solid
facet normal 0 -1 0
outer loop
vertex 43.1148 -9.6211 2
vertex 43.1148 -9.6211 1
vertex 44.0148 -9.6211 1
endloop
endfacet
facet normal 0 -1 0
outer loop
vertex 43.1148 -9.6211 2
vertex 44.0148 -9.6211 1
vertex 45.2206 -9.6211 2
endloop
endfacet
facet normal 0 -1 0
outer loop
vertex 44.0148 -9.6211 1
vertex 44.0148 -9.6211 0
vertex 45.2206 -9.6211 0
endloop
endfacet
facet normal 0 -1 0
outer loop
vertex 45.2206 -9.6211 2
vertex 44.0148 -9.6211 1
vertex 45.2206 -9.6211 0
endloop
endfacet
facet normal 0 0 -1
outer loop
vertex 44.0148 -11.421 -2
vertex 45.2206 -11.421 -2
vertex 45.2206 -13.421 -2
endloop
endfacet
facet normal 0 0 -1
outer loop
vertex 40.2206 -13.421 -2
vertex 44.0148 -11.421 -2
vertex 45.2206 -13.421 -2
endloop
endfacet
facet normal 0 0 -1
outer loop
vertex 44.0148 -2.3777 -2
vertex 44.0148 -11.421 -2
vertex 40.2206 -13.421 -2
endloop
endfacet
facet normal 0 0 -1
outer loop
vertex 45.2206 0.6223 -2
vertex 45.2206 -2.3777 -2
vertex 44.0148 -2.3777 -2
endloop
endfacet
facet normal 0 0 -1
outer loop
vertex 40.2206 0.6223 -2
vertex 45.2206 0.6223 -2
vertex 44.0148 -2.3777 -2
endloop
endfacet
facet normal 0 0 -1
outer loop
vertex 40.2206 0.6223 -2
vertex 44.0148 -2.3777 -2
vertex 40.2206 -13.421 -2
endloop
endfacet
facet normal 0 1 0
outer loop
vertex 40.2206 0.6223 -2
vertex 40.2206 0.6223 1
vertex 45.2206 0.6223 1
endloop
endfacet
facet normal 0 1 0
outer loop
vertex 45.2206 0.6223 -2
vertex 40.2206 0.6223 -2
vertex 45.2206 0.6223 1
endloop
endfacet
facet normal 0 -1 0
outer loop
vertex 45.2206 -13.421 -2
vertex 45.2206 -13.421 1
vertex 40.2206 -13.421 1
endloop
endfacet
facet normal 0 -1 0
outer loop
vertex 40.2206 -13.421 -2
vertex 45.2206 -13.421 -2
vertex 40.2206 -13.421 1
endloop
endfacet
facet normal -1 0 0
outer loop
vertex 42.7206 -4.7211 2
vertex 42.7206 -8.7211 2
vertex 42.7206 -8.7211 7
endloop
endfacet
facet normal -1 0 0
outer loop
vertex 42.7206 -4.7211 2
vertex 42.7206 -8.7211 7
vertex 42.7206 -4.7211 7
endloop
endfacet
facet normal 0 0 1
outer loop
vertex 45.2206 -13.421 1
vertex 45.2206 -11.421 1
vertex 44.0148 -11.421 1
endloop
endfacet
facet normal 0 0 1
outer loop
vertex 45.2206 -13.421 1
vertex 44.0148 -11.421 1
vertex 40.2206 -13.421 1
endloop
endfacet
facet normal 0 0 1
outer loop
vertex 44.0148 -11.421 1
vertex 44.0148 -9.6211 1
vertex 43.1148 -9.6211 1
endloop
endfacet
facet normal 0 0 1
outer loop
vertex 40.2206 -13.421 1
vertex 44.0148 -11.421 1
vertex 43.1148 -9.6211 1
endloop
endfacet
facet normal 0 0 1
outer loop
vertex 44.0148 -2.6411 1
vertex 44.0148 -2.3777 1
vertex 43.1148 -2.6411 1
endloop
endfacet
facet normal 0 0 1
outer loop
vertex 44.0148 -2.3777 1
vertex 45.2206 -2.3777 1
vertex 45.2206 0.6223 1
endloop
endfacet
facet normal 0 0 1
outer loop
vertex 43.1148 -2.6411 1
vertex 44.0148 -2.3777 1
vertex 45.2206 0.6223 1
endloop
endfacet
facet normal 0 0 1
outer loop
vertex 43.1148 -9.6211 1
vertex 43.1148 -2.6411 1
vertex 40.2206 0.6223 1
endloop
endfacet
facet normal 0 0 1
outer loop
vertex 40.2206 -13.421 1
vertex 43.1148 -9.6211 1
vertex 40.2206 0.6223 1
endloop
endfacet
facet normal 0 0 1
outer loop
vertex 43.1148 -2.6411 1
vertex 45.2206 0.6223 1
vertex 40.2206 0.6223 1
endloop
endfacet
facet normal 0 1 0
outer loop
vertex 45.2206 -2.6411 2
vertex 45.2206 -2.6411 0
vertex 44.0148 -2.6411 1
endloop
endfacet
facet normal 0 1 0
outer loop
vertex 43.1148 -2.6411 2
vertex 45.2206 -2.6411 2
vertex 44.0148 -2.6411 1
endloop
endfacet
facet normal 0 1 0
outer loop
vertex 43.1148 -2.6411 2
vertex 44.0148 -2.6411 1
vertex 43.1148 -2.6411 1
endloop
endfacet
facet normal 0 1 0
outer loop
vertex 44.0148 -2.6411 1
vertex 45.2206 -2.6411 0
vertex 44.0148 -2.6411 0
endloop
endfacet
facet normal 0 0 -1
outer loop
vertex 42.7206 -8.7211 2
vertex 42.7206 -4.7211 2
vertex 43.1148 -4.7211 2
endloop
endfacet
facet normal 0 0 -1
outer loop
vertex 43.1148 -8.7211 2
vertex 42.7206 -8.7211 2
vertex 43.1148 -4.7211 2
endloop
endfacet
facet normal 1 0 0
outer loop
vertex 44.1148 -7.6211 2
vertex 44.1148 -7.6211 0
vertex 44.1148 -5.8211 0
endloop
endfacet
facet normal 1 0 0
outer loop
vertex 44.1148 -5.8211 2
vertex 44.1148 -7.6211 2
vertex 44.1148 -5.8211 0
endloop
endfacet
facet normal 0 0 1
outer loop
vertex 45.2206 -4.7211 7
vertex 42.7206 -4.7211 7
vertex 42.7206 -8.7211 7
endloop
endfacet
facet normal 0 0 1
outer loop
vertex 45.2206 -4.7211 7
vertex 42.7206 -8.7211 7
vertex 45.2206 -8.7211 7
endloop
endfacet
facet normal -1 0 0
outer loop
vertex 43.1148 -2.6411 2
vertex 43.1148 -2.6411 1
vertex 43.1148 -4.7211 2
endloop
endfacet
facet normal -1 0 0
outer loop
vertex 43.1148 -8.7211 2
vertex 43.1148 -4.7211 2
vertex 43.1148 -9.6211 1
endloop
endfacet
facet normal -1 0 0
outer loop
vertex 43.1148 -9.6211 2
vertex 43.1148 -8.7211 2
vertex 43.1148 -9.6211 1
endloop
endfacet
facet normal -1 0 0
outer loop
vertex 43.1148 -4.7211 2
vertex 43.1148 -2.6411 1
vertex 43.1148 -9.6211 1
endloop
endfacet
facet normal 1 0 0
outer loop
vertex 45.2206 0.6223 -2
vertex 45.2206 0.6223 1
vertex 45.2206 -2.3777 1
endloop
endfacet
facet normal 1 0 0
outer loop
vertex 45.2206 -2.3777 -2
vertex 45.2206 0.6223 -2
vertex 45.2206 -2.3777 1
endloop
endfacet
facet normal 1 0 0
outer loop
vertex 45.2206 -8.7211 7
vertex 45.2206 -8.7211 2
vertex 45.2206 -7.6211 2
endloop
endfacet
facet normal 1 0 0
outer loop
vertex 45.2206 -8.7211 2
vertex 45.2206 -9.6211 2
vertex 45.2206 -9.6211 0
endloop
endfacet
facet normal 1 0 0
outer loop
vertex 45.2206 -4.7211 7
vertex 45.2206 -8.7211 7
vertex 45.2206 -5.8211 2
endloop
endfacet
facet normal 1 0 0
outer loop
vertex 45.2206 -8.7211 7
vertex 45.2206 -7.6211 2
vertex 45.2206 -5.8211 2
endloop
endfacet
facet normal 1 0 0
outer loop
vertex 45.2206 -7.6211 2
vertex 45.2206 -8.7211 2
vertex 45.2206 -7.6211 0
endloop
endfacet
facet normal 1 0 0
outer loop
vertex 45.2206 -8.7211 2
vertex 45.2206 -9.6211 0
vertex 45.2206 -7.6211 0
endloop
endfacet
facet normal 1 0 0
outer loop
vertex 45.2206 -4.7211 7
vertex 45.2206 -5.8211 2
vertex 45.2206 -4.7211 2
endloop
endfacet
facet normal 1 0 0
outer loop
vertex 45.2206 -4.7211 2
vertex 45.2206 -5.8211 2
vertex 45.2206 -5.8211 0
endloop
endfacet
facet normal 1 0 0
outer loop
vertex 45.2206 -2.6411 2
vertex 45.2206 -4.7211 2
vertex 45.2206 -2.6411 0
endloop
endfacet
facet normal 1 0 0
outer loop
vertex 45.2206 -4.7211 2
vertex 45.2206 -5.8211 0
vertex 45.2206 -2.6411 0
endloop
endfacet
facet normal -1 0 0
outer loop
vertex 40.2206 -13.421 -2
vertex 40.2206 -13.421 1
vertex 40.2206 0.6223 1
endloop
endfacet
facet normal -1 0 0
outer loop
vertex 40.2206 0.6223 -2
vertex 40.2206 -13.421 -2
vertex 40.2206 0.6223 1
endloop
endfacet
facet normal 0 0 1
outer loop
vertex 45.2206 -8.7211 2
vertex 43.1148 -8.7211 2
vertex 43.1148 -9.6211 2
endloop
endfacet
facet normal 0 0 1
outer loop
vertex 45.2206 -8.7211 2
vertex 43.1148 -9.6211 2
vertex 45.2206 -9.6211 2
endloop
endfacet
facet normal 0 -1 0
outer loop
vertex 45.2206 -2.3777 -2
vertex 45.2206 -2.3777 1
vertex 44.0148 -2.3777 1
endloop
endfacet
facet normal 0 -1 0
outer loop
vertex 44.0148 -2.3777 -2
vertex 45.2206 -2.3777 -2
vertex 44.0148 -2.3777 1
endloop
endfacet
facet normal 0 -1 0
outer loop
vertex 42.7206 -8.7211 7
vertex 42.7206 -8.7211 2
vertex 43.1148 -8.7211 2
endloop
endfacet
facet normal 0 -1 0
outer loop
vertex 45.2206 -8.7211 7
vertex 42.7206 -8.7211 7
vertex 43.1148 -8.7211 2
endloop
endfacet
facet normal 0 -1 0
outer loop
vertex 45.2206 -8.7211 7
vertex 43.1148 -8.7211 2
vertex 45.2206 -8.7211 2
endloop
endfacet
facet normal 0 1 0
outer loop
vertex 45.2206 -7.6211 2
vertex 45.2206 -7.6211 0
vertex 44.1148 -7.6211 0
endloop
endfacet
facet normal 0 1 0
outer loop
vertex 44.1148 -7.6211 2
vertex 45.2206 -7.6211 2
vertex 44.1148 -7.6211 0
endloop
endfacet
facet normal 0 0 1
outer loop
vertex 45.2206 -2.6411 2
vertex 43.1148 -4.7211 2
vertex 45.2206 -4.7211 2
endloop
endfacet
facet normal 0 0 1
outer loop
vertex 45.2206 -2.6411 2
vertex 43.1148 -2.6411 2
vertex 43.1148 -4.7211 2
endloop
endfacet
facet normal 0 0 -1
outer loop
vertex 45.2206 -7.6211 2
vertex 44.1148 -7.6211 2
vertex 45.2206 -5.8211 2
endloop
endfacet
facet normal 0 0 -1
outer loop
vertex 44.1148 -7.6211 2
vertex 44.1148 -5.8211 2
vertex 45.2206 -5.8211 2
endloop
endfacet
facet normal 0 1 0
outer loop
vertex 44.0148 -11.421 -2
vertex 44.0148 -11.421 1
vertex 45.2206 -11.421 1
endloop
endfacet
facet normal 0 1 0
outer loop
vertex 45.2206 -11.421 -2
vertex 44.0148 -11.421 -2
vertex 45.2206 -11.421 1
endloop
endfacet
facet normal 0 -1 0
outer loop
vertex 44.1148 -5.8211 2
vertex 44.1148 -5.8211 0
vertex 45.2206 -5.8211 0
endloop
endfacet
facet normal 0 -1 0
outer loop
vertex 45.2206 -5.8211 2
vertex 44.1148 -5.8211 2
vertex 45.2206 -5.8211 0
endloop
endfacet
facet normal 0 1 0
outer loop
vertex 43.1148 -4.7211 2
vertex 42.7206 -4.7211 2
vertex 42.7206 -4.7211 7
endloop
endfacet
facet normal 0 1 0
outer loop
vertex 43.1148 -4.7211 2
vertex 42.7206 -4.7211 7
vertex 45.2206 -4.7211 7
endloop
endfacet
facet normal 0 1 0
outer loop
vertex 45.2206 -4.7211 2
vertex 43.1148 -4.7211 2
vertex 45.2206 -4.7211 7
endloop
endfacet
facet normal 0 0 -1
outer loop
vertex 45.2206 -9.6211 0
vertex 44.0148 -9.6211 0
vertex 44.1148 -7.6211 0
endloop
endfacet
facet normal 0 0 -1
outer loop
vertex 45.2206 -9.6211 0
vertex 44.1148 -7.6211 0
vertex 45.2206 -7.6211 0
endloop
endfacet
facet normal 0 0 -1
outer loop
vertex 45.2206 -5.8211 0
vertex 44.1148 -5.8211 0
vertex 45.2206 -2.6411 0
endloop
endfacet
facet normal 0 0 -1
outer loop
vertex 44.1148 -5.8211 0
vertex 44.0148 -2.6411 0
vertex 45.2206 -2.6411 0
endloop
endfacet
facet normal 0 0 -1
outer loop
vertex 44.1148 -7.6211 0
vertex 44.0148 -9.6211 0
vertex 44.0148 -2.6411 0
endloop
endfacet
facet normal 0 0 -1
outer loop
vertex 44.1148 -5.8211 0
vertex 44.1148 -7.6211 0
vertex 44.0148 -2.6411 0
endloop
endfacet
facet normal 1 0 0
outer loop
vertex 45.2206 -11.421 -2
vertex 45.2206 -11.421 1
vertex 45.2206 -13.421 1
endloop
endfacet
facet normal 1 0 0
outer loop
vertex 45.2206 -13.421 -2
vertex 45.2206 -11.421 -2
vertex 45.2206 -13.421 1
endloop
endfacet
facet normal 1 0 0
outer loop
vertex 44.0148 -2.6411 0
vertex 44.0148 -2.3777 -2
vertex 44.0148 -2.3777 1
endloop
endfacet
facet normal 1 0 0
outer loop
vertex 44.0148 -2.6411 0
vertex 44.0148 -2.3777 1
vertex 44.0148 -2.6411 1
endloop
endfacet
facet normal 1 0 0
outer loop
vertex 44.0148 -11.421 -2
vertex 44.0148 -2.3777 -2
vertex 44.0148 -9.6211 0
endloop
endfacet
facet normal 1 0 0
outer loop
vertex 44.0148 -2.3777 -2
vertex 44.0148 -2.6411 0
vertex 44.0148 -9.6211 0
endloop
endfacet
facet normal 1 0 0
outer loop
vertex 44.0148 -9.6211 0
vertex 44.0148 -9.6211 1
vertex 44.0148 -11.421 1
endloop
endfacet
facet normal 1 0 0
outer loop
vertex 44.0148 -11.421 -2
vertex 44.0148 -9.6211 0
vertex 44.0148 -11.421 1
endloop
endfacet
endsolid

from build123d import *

# Parameters (mm, degrees)
SALIENTE_EXTRUIR1_DEPTH      = 2
CROQUIS2_W                   = 2.5
CROQUIS2_H                   = 4
SALIENTE_EXTRUIR2_DEPTH      = 5
SALIENTE_EXTRUIR3_DEPTH      = 2
SALIENTE_EXTRUIR3_DEPTH_BACK = 1


with BuildPart() as part:
    # Croquis1 → Saliente-Extruir1 (new body)
    with BuildSketch(Plane.XY):
        Polygon((44.714751496, -7.621064437), (44.114751496, -7.621064437), (44.114751496, -5.821064437), (45.220609876, -5.821064437), (45.220609876, -4.641064437), (45.220609876, -2.641064437), (43.114751496, -2.641064437), (43.114751496, -9.621064437), (44.114751496, -9.621064437), (45.220609876, -9.621064437), (45.220609876, -7.621064437), align=None)
    extrude(amount=SALIENTE_EXTRUIR1_DEPTH)

    # Croquis2 → Saliente-Extruir2 (add)
    with BuildSketch(Plane.XY.offset(2)):
        with Locations((43.970609876, -6.721064437)):
            Rectangle(CROQUIS2_W, CROQUIS2_H)
    extrude(amount=SALIENTE_EXTRUIR2_DEPTH)

    # Croquis3 → Saliente-Extruir3 (add, two sides: drawn at the far end of the back side and taken through both)
    with BuildSketch(Plane(origin=(0, 0, 0), x_dir=(-1, 0, 0), z_dir=(0, 0, -1)).offset(-SALIENTE_EXTRUIR3_DEPTH_BACK)):
        Polygon((-44.014751496, -2.37771269), (-44.014751496, -9.420966811), (-44.014751496, -11.420966811), (-45.220609876, -11.420966811), (-45.220609876, -13.420966811), (-40.220609876, -13.420966811), (-40.220609876, -12.420966811), (-40.220609876, 0.62228731), (-45.220609876, 0.62228731), (-45.220609876, -2.37771269), align=None)
    extrude(amount=SALIENTE_EXTRUIR3_DEPTH + SALIENTE_EXTRUIR3_DEPTH_BACK)


solid = part.part
